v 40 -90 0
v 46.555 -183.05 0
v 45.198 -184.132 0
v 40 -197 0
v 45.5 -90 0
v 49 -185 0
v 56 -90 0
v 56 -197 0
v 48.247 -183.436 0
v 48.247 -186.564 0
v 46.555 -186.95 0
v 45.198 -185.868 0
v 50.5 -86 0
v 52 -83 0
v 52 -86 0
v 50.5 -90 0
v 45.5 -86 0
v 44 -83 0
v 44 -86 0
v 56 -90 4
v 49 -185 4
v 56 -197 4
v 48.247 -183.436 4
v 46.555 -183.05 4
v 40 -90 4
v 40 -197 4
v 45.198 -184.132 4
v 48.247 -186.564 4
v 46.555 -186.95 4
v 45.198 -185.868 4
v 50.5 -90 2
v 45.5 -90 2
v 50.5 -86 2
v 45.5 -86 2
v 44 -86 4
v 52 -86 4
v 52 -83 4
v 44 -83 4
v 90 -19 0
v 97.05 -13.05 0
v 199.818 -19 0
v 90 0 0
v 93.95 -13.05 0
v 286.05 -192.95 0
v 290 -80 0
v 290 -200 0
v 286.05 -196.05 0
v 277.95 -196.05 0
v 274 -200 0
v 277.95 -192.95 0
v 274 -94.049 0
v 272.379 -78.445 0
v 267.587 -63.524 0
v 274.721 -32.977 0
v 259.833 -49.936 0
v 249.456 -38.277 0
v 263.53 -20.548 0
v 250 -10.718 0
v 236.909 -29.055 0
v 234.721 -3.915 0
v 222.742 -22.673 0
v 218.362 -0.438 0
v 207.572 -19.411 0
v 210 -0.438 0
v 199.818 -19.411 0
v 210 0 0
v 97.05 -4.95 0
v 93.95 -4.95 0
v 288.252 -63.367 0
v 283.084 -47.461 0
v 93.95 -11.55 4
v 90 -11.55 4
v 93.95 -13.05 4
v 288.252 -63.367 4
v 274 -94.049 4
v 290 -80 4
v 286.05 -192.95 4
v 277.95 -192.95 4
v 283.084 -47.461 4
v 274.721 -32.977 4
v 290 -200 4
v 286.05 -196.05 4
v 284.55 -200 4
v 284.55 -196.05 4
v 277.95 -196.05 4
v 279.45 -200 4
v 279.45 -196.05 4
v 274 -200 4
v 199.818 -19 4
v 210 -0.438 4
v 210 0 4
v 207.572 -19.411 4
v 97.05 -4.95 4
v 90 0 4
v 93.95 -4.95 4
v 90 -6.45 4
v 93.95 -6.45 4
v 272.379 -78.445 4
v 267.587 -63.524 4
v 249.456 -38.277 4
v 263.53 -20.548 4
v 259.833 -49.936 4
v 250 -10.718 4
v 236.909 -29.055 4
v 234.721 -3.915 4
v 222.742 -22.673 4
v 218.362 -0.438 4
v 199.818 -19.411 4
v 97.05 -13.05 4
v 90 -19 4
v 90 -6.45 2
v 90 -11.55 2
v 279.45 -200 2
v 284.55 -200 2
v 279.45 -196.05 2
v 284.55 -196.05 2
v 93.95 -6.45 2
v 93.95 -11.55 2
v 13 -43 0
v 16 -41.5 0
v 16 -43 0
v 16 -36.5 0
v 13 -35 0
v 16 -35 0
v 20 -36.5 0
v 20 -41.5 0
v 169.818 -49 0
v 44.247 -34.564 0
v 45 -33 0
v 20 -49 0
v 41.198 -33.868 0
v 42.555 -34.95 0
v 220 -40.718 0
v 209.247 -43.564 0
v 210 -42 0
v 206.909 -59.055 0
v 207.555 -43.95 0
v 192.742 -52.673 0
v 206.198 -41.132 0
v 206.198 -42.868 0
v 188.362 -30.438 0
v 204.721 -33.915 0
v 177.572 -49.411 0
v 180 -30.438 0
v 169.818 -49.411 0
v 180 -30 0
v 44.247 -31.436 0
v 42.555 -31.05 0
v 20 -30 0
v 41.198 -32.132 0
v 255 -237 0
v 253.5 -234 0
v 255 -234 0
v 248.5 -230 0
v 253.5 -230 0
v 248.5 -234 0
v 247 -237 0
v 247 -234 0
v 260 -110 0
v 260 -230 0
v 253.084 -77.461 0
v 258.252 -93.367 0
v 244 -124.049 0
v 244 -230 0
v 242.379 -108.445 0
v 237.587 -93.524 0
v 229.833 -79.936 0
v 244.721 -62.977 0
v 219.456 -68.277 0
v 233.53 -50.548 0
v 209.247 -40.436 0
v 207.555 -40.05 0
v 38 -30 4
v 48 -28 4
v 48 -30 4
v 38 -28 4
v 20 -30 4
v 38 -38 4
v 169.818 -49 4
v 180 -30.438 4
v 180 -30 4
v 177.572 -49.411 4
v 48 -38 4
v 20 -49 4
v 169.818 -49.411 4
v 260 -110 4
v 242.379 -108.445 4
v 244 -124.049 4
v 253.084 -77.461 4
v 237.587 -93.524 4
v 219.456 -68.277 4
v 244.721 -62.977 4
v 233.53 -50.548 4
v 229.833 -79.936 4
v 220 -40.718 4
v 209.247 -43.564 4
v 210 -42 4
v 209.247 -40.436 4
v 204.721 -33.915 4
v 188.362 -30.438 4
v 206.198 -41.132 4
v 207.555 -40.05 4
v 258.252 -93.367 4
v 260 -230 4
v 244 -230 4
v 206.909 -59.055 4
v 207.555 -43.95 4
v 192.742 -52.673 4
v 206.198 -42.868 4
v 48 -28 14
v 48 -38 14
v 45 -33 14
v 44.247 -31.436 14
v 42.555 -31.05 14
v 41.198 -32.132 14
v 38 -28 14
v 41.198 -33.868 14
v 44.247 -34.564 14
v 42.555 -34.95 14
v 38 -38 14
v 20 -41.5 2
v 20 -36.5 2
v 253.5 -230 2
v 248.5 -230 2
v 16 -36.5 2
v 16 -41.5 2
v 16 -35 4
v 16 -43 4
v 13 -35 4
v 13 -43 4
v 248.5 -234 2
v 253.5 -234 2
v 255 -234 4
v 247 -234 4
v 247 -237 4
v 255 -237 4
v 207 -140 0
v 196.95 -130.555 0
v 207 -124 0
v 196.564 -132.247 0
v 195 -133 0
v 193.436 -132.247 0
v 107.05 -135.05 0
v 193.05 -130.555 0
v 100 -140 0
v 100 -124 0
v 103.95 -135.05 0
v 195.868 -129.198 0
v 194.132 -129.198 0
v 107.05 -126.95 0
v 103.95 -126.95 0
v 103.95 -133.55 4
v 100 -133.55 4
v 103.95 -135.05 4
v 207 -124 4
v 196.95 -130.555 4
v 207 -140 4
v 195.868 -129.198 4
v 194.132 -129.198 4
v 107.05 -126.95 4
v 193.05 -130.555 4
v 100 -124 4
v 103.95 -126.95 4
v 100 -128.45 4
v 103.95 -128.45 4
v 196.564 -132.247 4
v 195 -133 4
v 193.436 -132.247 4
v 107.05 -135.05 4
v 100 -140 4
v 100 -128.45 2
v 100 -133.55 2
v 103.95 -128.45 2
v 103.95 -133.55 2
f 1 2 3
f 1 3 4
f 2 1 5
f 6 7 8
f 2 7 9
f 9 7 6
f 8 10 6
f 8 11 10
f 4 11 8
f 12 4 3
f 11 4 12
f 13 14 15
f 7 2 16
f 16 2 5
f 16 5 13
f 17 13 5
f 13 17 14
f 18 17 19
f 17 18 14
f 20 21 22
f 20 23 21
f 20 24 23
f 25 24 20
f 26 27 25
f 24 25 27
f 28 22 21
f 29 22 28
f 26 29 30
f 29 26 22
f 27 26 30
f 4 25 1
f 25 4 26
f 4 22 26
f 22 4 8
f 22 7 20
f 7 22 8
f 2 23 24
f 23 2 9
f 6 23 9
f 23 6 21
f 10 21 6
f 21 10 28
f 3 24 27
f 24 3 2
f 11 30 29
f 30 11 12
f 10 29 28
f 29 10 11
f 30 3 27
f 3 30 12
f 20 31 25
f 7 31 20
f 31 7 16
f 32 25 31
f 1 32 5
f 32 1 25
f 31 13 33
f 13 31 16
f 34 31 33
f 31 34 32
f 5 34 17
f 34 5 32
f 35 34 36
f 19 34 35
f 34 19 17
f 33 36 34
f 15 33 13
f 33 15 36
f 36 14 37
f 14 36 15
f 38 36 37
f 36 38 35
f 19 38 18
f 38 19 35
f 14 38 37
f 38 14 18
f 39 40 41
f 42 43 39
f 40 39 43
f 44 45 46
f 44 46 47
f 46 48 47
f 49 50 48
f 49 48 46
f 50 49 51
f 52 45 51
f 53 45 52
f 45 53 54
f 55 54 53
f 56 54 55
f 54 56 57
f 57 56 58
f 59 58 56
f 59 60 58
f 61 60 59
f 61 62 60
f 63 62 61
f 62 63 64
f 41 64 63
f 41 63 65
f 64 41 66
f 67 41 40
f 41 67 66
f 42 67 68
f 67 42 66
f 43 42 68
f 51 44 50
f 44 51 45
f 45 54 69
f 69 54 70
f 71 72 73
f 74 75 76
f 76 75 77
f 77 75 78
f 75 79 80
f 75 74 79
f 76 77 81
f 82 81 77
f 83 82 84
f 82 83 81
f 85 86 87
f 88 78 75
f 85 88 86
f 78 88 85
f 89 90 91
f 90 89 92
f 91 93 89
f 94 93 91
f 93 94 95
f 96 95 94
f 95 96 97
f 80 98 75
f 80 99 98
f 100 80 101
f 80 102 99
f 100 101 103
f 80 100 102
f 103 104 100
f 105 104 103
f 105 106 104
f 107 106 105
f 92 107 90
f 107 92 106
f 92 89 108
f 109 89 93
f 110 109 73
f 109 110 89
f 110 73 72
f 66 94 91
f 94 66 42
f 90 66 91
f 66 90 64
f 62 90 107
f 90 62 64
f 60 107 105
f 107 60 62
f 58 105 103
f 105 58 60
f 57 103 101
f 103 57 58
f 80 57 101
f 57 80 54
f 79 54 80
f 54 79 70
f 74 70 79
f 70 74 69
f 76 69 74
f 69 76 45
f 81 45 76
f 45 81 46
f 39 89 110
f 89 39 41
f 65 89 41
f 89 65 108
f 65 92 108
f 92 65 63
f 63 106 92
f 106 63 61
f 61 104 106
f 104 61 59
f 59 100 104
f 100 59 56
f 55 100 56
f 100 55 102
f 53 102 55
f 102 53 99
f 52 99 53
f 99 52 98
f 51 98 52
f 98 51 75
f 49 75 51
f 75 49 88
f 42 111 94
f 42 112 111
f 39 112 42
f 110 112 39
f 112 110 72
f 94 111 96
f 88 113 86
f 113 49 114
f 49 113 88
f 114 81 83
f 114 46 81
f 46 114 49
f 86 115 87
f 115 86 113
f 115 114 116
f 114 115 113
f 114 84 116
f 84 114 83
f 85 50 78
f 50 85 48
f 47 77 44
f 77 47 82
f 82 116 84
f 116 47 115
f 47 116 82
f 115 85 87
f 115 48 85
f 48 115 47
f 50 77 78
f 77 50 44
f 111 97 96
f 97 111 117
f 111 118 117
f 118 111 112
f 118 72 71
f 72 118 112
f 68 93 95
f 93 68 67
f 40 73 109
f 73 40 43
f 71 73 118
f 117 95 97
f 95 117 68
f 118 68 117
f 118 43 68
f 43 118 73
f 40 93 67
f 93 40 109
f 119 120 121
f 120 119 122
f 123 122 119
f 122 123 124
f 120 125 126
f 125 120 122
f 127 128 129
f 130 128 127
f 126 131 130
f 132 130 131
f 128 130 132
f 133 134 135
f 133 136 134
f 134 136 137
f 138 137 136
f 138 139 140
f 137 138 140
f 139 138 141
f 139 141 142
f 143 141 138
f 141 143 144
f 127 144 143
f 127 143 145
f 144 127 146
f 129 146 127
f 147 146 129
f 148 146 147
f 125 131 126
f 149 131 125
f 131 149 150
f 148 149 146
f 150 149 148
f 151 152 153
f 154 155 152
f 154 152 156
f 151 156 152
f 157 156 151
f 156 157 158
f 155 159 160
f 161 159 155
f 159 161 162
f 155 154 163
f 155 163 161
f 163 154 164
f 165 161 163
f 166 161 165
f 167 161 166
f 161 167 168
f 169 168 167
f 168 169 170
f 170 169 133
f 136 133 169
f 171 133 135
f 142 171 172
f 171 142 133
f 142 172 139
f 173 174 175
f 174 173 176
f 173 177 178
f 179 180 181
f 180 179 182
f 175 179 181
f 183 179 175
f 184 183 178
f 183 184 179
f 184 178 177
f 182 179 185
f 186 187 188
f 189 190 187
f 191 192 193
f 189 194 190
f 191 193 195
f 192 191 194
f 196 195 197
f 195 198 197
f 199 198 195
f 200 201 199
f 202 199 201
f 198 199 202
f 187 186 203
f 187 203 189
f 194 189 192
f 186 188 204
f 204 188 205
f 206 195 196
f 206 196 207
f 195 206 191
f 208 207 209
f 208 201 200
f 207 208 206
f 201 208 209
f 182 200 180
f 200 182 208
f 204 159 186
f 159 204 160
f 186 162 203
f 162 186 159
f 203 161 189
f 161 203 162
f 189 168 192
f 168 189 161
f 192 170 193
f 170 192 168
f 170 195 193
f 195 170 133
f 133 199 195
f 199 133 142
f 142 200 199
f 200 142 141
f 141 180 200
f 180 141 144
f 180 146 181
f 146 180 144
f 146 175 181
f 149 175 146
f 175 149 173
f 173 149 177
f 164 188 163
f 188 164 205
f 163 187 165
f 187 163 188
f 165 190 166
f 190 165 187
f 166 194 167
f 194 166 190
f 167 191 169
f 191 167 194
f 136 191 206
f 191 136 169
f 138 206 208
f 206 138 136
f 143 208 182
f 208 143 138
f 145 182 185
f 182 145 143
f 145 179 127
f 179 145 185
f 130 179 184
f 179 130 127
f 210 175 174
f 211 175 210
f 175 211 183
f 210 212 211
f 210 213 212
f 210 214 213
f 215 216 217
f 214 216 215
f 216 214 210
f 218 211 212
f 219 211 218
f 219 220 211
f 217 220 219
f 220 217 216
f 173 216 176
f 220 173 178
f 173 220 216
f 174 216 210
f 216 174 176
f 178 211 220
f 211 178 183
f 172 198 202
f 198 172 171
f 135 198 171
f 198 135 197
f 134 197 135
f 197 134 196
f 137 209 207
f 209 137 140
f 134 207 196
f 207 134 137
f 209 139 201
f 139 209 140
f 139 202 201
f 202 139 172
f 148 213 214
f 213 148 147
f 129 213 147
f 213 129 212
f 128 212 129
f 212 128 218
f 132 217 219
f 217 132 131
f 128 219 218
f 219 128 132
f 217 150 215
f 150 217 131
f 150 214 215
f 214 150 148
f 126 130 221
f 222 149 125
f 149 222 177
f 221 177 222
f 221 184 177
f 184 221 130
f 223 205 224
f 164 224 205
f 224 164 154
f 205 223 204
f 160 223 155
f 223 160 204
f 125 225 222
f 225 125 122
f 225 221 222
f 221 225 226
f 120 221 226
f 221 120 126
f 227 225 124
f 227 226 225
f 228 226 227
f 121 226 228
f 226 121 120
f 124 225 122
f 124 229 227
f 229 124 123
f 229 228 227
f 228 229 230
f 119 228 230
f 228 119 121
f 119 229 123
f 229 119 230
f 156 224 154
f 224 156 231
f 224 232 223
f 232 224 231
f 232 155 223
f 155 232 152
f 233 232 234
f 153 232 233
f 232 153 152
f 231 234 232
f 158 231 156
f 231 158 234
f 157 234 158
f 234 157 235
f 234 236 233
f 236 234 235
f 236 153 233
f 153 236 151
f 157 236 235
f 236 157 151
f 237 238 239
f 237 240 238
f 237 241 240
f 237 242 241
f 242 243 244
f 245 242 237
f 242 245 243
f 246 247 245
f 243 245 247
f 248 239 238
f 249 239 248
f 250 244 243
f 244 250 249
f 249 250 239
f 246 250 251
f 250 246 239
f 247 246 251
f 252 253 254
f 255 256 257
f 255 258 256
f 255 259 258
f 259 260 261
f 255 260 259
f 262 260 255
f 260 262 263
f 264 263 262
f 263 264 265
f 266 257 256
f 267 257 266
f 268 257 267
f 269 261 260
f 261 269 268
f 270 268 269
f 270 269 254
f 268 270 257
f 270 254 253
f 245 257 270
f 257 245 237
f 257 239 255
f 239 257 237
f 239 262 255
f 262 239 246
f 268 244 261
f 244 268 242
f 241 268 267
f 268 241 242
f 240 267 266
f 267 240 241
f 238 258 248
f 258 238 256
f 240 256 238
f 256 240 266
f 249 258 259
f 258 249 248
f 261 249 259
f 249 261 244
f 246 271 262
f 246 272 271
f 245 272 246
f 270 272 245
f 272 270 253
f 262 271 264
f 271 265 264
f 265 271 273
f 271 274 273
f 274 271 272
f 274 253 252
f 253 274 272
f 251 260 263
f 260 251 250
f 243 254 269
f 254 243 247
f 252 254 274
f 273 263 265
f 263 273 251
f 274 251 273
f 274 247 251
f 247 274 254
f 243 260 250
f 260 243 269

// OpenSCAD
// file: flat-panel-joint.scad
/* 
 * Based on a work at https://skfb.ly/p8Zyr.
 * "Flat panel joint part 1" (https://skfb.ly/p8Zyr) by payo@TensileCreator is licensed under Creative Commons Attribution-NonCommercial (http://creativecommons.org/licenses/by-nc/4.0/).
 */

/*
 * Usage example:
 * add_seam_to(joint_count = 7, translate_seam = [0, -50, 0], rotate_seam = [0, 0, 90]) {
 *   translate([0, -50, 0])
 *   cube([50, 80, 4]);
 * };
 *
 * mirror([1, 0, 0]) {
 *   add_seam_to(joint_count = 7, translate_seam = [20, 30, 0], rotate_seam = [0, 0, 270], invert_seam = true) {
 *     translate([20, -50, 0])
 *     cube([50, 80, 4]);
 *   };
 * };
 */
module add_seam_to(joint_count, translate_seam = [0, 0, 0], rotate_seam = [0, 0, 0], scale_xy = 1, z_height = 4, invert_seam = false) {
    joint_spacing=21;
    tolerance=0.05;
    first_iteration_count = ceil(joint_count / 2) - 1;
    second_iteration_count = max(floor(joint_count / 2) - 1, 0);

    union() {
        difference() {
            children(0);
            if (invert_seam || joint_count > 1) {
                translate(translate_seam)
                rotate(rotate_seam)
                for (i=[0:(invert_seam ? first_iteration_count : second_iteration_count)]) {
                    translate([(i * joint_spacing * scale_xy) + (invert_seam ? (8 * scale_xy) : (10.5 * scale_xy)), 0, 0])
                    rotate([0, 0, invert_seam ? 180 : 0])
                    union() {
                        translate([1.5 * scale_xy - tolerance, -4 * scale_xy, z_height / 2])
                        cube([5 * scale_xy + (tolerance*2), 4 * scale_xy + tolerance, (z_height / 2) + tolerance]);
                        translate([0 - tolerance, -7 * scale_xy - tolerance, 0 - tolerance])
                        cube([8 * scale_xy + (tolerance*2), 3 * scale_xy + (tolerance*2), z_height + (tolerance*2)]);
                    }
                }
            }
        }
        if (!invert_seam || joint_count > 1) {
            translate(translate_seam)
            rotate(rotate_seam)
            for (i=[(invert_seam ? 1 : 0):(invert_seam ? second_iteration_count : first_iteration_count)]) {
                translate([(i * joint_spacing * scale_xy), 0, 0])
                rotate([0, 0, invert_seam ? 180 : 0])
                union() {
                    translate([1.5 * scale_xy, 0, 0])
                    cube([5 * scale_xy, 4 * scale_xy, (z_height / 2)]);
                    translate([0, 4 * scale_xy, 0])
                    cube([8 * scale_xy, 3 * scale_xy, z_height]);
                }
            }
        }
    }
}
// main file
use <flat-panel-joint.scad>;

side_width = 16;
side_height = 19;

inner_width = 408;
inner_height = 288;

outer_width = inner_width + side_width * 2;
outer_height = inner_height + side_height;
radius = 80;

module cover_shape() {
  translate([radius, -radius, 0]) 
  circle(radius);

  rad_midpoint_dist = outer_width - radius - radius;
  translate([radius, -radius -radius, 0])
  square([rad_midpoint_dist, radius * 2]);

  translate([outer_width - radius, -radius, 0])
  circle(radius);

  translate([0, -outer_height, 0]) 
  square([outer_width, outer_height - radius]);
}

module screw_hole() {
  translate([0, 0, -15])
  cylinder(h = 30, r = 2);
}

module final_prototype() {
  difference() {
    union() {
      difference() {
        linear_extrude(4) {
          cover_shape();
        }

        translate([side_width, -side_height, -5])
        linear_extrude(10) {
          scale([
            inner_width / outer_width,
            inner_height / outer_height,
            1
          ])
          cover_shape();
        }
      }

      translate([side_width + 207, -(side_height - 16), 9])
      cube(10, center = true);
    }

    union() {
      translate([side_width - 9, -inner_height - 7, 0])
      screw_hole();

      translate([side_width + inner_width + side_width - 9, -inner_height - 7, 0])
      screw_hole();

      translate([inner_width - 20, -(side_height - 7), 0])
      screw_hole();

      translate([side_width + 207, -(side_height - 16), 0])
      screw_hole();
    }
  }
}

translate([40, 110, 0])
add_seam_to(joint_count = 1, translate_seam = [4, -200, 0]) {
  intersection() {
    translate([0, -400, -100])
    cube(200);

    final_prototype();
  }
}

add_seam_to(joint_count = 1, translate_seam = [90, -5, 0], rotate_seam = [0, 0, 270], invert_seam = true) {
  add_seam_to(joint_count = 1, translate_seam = [278, -200, 0], invert_seam = true) {
    mirror([1, 0, 0])
    translate([-290, 0, 0])
    intersection() {
      translate([0, -200, -100])
      cube(200);

      final_prototype();
    }
  }
}

add_seam_to(joint_count = 1, translate_seam = [255, -230, 0], rotate_seam = [0, 0, 180]) {
  add_seam_to(joint_count = 1, translate_seam = [20, -43, 0], rotate_seam = [0, 0, 90]) {
    translate([-180, -30, 0])
    intersection() {
      translate([200, -200, -100])
      cube(300);

      final_prototype();
    }
  }
}

add_seam_to(joint_count = 1, translate_seam = [100, -127, 0], rotate_seam = [0, 0, 270], invert_seam = true) {
  rotate([0, 0, 90])
  mirror([1, 0, 0])
  translate([-300, 100, 0])
  intersection() {
    translate([200, -500, -100])
    cube(300);

    final_prototype();
  }
}
